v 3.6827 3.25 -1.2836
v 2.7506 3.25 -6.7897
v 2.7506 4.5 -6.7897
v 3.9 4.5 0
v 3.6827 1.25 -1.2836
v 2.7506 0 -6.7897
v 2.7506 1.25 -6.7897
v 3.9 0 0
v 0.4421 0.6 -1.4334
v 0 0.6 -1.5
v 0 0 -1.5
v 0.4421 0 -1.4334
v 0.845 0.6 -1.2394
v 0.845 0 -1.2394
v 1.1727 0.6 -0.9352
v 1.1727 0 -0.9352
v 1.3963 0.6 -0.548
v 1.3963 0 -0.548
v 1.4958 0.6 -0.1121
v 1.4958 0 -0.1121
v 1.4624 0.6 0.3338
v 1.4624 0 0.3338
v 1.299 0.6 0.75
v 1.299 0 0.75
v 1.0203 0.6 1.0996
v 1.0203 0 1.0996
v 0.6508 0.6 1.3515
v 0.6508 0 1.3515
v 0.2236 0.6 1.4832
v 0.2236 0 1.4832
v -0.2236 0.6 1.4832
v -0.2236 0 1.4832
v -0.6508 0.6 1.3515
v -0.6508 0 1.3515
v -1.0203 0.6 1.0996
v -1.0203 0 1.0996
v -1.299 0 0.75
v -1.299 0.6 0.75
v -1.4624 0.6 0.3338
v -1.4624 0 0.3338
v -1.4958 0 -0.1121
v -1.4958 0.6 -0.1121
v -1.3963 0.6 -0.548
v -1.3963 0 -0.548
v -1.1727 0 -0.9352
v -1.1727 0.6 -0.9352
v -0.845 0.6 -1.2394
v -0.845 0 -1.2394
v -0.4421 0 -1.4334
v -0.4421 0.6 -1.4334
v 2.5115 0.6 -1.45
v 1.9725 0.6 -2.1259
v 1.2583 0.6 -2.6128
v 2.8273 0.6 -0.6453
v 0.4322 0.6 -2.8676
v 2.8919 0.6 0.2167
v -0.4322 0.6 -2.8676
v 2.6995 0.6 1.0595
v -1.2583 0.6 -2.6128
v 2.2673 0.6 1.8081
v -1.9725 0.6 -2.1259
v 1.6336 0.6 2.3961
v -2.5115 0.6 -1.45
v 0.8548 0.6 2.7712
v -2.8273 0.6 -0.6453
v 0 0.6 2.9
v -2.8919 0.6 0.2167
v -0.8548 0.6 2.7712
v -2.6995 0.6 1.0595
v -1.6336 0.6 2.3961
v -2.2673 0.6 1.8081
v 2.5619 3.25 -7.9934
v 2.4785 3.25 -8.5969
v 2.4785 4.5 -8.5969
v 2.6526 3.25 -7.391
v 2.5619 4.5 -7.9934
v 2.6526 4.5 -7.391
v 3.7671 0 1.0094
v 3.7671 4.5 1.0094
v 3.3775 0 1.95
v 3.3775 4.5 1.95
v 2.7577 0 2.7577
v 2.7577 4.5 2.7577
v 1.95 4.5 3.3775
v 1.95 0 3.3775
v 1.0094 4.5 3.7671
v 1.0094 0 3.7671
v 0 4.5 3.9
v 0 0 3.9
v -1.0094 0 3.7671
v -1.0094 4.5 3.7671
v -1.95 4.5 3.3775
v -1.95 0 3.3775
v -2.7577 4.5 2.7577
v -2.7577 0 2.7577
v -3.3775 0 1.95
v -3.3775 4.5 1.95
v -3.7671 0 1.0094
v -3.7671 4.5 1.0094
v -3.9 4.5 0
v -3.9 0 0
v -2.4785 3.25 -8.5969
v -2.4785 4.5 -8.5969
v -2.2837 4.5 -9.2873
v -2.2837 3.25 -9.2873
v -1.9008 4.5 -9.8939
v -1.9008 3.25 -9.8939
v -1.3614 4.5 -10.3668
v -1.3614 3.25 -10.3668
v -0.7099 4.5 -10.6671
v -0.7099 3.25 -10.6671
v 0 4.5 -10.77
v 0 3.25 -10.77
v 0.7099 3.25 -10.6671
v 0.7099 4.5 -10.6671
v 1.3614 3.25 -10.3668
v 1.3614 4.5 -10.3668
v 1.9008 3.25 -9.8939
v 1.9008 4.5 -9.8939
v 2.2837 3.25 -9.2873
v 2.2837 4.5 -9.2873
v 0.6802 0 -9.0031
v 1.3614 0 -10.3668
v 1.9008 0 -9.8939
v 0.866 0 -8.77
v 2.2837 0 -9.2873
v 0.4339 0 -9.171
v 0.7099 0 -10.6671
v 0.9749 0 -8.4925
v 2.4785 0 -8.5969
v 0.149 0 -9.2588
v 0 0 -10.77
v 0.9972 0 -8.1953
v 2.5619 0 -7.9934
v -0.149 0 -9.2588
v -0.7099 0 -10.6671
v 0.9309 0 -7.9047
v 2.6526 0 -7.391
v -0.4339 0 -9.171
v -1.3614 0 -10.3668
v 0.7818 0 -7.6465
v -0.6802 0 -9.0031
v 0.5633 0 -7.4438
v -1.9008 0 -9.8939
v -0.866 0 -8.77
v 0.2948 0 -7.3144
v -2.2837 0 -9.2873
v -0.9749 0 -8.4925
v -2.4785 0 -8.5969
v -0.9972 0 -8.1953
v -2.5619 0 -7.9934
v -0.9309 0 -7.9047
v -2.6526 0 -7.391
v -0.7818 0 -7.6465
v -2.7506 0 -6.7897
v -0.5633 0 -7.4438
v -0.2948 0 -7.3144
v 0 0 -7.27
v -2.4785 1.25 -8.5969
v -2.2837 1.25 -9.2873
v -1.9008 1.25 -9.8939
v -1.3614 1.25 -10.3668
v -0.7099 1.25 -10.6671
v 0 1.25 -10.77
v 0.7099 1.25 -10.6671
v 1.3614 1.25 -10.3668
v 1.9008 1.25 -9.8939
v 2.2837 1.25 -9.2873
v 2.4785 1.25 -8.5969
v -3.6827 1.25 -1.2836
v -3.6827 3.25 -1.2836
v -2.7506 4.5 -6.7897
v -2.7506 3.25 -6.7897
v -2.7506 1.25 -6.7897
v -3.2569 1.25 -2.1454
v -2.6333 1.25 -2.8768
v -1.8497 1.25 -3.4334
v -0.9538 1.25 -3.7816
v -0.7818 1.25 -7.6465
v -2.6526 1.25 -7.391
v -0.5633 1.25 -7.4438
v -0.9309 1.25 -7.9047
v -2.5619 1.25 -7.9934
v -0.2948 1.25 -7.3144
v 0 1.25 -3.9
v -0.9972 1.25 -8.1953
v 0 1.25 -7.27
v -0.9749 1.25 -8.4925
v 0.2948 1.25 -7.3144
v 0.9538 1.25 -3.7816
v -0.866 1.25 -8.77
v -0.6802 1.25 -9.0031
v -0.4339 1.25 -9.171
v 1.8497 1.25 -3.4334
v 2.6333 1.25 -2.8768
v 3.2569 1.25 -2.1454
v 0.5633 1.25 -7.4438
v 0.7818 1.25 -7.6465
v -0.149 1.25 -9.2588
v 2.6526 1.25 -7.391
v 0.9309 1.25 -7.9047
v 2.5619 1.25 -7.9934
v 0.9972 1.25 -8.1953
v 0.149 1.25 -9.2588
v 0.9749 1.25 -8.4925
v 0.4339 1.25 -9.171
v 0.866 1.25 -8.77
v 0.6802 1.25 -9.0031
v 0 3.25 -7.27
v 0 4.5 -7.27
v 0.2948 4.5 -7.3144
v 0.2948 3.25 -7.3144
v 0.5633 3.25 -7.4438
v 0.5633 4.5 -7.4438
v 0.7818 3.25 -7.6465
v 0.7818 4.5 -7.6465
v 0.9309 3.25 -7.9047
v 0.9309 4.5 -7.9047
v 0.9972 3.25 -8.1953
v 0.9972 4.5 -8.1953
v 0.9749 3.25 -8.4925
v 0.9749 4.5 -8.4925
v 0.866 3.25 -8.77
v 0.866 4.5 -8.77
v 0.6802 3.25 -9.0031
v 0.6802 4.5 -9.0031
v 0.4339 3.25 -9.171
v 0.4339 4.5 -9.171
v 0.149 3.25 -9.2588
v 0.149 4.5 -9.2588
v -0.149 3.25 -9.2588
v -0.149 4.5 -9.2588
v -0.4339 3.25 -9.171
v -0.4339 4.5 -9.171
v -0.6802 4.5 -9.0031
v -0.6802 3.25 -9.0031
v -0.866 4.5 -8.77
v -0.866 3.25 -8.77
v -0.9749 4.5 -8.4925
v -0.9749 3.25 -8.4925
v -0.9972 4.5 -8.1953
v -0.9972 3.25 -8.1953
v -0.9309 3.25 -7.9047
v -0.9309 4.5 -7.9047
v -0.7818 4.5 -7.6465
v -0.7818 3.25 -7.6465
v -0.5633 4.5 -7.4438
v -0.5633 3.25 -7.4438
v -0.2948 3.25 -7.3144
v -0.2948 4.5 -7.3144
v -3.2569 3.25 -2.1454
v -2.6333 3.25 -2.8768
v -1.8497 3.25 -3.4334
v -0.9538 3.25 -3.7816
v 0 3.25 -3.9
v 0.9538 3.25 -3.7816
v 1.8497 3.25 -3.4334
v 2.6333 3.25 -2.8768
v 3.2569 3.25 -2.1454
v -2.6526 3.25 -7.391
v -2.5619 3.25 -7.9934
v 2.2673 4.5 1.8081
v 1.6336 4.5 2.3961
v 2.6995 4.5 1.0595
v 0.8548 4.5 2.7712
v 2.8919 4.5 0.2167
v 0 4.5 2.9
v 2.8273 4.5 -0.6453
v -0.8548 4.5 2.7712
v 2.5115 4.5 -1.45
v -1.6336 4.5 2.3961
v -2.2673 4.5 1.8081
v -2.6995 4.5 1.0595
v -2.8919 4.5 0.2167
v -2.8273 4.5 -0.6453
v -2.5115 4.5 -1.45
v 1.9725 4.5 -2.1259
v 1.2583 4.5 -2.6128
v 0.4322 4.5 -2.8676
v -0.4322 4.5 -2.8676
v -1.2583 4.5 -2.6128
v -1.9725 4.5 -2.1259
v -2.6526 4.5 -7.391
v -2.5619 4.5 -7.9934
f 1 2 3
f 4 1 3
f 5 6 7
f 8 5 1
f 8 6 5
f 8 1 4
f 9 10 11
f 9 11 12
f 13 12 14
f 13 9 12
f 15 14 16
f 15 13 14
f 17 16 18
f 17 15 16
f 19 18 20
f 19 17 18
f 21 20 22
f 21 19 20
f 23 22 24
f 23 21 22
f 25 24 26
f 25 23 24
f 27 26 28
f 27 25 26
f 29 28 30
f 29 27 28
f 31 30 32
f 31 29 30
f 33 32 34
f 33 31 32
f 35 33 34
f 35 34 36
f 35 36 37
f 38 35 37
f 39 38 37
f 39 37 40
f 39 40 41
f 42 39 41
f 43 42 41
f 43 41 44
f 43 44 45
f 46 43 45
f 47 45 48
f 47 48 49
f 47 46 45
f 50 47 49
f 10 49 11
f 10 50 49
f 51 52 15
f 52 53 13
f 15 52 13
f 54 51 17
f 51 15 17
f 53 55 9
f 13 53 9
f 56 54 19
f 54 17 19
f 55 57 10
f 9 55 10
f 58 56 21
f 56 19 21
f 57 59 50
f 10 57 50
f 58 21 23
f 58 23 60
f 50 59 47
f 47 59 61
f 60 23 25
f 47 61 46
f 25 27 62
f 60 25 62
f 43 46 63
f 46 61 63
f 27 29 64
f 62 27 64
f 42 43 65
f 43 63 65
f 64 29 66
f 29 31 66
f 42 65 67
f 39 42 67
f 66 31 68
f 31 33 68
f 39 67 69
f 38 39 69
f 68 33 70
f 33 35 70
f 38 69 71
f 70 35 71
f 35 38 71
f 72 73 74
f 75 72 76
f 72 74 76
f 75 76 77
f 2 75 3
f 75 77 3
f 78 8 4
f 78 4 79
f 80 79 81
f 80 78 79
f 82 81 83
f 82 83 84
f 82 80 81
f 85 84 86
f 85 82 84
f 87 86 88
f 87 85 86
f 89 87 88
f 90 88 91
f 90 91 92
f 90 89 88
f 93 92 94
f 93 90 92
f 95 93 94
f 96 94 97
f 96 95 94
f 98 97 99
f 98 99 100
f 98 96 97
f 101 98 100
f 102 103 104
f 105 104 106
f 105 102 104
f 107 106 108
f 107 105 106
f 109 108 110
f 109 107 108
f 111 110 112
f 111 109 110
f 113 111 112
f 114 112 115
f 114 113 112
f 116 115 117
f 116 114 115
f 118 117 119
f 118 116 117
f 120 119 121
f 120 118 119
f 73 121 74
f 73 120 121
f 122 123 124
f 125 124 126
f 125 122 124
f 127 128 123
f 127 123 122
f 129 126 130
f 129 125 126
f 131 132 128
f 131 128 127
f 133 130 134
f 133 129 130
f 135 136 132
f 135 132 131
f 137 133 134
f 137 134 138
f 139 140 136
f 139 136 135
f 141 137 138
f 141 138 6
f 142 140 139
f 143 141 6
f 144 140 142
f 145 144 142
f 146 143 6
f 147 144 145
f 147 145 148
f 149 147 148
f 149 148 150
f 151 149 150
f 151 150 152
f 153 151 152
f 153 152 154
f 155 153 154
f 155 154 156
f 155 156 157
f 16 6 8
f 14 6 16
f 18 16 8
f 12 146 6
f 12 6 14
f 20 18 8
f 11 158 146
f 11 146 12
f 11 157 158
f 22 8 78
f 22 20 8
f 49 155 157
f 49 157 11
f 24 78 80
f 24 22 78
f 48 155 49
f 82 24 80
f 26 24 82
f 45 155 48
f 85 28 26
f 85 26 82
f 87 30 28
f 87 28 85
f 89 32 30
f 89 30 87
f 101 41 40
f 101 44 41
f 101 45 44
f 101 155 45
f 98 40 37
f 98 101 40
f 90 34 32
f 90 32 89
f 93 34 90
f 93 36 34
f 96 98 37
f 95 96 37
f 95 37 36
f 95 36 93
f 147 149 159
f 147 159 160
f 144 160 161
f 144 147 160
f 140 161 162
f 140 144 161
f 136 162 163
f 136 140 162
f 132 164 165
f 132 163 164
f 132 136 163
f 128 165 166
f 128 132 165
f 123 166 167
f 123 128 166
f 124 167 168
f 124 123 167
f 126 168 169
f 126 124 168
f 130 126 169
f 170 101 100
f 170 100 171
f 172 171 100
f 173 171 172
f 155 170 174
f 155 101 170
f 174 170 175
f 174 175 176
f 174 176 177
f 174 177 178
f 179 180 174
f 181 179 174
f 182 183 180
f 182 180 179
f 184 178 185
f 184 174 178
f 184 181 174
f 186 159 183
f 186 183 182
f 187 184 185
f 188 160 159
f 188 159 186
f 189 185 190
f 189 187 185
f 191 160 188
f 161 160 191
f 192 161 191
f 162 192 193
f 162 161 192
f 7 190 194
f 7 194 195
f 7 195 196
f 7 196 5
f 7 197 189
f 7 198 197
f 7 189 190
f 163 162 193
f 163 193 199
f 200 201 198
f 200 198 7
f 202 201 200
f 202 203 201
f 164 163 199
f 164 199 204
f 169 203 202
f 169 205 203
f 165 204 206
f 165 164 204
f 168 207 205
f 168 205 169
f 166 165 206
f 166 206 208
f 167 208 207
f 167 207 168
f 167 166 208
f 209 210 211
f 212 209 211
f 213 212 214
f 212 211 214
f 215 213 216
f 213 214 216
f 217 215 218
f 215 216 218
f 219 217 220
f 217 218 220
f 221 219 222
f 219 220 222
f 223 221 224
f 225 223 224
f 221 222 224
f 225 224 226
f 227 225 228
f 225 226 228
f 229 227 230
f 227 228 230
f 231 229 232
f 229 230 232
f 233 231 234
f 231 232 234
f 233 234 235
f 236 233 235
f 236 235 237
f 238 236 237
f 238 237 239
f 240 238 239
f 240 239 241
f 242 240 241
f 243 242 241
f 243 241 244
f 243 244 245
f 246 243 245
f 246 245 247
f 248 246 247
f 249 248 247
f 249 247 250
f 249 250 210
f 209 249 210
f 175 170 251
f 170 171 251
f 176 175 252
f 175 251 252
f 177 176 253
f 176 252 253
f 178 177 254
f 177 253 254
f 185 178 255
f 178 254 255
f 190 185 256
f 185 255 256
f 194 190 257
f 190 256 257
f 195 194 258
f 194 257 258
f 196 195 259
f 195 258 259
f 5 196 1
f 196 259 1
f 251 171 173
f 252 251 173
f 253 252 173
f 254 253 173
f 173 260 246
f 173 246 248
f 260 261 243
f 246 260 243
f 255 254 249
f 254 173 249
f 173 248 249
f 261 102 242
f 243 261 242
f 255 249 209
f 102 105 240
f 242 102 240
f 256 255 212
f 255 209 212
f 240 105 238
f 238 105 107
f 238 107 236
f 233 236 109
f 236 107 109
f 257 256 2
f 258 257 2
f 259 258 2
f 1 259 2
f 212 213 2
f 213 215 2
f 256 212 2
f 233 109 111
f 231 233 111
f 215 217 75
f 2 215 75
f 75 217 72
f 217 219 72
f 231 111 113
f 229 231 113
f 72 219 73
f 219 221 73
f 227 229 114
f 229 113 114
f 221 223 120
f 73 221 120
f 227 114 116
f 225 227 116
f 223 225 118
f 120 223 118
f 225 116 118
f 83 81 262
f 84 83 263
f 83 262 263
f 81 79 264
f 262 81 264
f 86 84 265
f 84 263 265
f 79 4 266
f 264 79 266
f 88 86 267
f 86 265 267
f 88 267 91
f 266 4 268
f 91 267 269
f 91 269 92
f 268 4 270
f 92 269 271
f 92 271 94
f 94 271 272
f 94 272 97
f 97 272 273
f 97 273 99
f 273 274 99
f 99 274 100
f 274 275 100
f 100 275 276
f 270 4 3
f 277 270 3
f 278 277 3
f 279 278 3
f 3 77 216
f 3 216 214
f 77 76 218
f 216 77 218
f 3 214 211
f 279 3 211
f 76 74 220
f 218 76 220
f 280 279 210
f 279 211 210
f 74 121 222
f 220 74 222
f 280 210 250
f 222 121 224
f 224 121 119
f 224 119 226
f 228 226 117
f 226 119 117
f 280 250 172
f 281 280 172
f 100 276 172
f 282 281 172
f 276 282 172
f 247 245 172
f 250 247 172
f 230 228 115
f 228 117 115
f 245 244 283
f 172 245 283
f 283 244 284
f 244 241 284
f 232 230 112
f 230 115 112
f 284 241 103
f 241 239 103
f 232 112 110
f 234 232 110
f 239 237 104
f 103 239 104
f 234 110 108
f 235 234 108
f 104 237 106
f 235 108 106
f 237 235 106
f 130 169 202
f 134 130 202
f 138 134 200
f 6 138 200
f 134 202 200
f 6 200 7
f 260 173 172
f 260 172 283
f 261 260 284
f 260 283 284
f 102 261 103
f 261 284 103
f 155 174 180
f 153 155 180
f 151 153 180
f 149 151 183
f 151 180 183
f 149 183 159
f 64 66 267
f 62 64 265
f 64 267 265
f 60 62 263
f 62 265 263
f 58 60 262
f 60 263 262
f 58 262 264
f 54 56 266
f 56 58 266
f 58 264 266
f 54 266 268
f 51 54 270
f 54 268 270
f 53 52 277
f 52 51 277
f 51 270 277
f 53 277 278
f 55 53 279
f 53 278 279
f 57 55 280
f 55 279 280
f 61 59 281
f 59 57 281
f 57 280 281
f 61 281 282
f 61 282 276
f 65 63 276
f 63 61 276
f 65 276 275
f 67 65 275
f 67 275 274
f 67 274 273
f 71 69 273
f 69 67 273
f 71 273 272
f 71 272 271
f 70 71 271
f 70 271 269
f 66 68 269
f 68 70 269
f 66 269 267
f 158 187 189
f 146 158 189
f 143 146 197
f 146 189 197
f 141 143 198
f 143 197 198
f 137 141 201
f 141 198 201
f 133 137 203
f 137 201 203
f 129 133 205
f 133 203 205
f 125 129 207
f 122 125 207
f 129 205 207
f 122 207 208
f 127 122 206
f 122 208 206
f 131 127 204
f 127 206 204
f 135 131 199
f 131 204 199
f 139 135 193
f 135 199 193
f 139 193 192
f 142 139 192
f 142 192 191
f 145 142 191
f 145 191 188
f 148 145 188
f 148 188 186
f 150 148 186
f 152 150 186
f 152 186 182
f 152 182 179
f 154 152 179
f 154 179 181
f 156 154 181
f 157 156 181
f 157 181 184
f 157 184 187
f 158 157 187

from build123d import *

# Parameters (mm, degrees)
SALIENTE_EXTRUIR1_DEPTH = 4.5
CROQUIS3_R              = 2.9
CROQUIS3_R_2            = 1
CORTAR_EXTRUIR1_DEPTH   = 13.30662017
REDONDEO1_R             = 50
CORTAR_EXTRUIR2_START   = -2.25
CROQUIS9_R              = 1
CORTAR_EXTRUIR2_DEPTH   = 1
SALIENTE_EXTRUIR2_START = -0.6
CROQUIS7_R              = 2.9
CROQUIS7_R_2            = 1.5
SALIENTE_EXTRUIR2_DEPTH = 0.6


with BuildPart() as part:
    # Croquis1 → Saliente-Extruir1 (new body)
    with BuildSketch(Plane(origin=(0, 0, 0), x_dir=(1, 0, 0), z_dir=(0, 1, 0))):
        with BuildLine():
            Line((-3.9, 0), (-2.5, 8.27))
            ThreePointArc((-2.5, 8.27), (0, 10.77), (2.5, 8.27))
            Line((2.5, 8.27), (3.9, 0))
            ThreePointArc((3.9, 0), (0, -3.9), (-3.9, 0))
        make_face()
    extrude(amount=SALIENTE_EXTRUIR1_DEPTH)

    # Croquis3 → Cortar-Extruir1 (cut, through all)
    with BuildSketch(Plane(origin=(0, 4.5, 0), x_dir=(1, 0, 0), z_dir=(0, 1, 0))):
        with Locations(Location((0, 0, 0), (0, 0, 270))):
            Circle(CROQUIS3_R)
        with Locations(Location((0, 8.27, 0), (0, 0, 270))):
            Circle(CROQUIS3_R_2)
    extrude(amount=-CORTAR_EXTRUIR1_DEPTH, mode=Mode.SUBTRACT)

    # Redondeo1
    redondeo1_edges = [part.edges().sort_by_distance(p)[0] for p in [
        (-2.5, 2.25, -8.27),
        (2.5, 2.25, -8.27),
    ]]
    fillet(redondeo1_edges, radius=REDONDEO1_R)

    # Croquis9 → Cortar-Extruir2 (cut, symmetric)
    with BuildSketch(Plane(origin=(0, 4.5, 0), x_dir=(1, 0, 0), z_dir=(0, 1, 0)).offset(CORTAR_EXTRUIR2_START)):
        with BuildLine():
            Line((3.682695525, 1.283648577), (2.750594125, 6.789704705))
            ThreePointArc((2.750594125, 6.789704705), (2.606305638, 7.69206861), (2.478532652, 8.596918789))
            ThreePointArc((2.478532652, 8.596918789), (0, 10.77), (-2.478532652, 8.596918789))
            ThreePointArc((-2.478532652, 8.596918789), (-2.606305638, 7.69206861), (-2.750594125, 6.789704705))
            Line((-2.750594125, 6.789704705), (-3.682695525, 1.283648577))
            ThreePointArc((-3.682695525, 1.283648577), (0, 3.9), (3.682695525, 1.283648577))
        make_face()
        with Locations(Location((0, 8.27, 0), (0, 0, 270))):
            Circle(CROQUIS9_R, mode=Mode.SUBTRACT)
    extrude(amount=CORTAR_EXTRUIR2_DEPTH, both=True, mode=Mode.SUBTRACT)

    # Croquis7 → Saliente-Extruir2 (add)
    with BuildSketch(Plane.XZ.offset(SALIENTE_EXTRUIR2_START)):
        with Locations(Location((0, 0, 0), (0, 0, 90))):
            Circle(CROQUIS7_R)
        with Locations(Location((0, 0, 0), (0, 0, 270))):
            Circle(CROQUIS7_R_2, mode=Mode.SUBTRACT)
    extrude(amount=SALIENTE_EXTRUIR2_DEPTH)


solid = part.part
